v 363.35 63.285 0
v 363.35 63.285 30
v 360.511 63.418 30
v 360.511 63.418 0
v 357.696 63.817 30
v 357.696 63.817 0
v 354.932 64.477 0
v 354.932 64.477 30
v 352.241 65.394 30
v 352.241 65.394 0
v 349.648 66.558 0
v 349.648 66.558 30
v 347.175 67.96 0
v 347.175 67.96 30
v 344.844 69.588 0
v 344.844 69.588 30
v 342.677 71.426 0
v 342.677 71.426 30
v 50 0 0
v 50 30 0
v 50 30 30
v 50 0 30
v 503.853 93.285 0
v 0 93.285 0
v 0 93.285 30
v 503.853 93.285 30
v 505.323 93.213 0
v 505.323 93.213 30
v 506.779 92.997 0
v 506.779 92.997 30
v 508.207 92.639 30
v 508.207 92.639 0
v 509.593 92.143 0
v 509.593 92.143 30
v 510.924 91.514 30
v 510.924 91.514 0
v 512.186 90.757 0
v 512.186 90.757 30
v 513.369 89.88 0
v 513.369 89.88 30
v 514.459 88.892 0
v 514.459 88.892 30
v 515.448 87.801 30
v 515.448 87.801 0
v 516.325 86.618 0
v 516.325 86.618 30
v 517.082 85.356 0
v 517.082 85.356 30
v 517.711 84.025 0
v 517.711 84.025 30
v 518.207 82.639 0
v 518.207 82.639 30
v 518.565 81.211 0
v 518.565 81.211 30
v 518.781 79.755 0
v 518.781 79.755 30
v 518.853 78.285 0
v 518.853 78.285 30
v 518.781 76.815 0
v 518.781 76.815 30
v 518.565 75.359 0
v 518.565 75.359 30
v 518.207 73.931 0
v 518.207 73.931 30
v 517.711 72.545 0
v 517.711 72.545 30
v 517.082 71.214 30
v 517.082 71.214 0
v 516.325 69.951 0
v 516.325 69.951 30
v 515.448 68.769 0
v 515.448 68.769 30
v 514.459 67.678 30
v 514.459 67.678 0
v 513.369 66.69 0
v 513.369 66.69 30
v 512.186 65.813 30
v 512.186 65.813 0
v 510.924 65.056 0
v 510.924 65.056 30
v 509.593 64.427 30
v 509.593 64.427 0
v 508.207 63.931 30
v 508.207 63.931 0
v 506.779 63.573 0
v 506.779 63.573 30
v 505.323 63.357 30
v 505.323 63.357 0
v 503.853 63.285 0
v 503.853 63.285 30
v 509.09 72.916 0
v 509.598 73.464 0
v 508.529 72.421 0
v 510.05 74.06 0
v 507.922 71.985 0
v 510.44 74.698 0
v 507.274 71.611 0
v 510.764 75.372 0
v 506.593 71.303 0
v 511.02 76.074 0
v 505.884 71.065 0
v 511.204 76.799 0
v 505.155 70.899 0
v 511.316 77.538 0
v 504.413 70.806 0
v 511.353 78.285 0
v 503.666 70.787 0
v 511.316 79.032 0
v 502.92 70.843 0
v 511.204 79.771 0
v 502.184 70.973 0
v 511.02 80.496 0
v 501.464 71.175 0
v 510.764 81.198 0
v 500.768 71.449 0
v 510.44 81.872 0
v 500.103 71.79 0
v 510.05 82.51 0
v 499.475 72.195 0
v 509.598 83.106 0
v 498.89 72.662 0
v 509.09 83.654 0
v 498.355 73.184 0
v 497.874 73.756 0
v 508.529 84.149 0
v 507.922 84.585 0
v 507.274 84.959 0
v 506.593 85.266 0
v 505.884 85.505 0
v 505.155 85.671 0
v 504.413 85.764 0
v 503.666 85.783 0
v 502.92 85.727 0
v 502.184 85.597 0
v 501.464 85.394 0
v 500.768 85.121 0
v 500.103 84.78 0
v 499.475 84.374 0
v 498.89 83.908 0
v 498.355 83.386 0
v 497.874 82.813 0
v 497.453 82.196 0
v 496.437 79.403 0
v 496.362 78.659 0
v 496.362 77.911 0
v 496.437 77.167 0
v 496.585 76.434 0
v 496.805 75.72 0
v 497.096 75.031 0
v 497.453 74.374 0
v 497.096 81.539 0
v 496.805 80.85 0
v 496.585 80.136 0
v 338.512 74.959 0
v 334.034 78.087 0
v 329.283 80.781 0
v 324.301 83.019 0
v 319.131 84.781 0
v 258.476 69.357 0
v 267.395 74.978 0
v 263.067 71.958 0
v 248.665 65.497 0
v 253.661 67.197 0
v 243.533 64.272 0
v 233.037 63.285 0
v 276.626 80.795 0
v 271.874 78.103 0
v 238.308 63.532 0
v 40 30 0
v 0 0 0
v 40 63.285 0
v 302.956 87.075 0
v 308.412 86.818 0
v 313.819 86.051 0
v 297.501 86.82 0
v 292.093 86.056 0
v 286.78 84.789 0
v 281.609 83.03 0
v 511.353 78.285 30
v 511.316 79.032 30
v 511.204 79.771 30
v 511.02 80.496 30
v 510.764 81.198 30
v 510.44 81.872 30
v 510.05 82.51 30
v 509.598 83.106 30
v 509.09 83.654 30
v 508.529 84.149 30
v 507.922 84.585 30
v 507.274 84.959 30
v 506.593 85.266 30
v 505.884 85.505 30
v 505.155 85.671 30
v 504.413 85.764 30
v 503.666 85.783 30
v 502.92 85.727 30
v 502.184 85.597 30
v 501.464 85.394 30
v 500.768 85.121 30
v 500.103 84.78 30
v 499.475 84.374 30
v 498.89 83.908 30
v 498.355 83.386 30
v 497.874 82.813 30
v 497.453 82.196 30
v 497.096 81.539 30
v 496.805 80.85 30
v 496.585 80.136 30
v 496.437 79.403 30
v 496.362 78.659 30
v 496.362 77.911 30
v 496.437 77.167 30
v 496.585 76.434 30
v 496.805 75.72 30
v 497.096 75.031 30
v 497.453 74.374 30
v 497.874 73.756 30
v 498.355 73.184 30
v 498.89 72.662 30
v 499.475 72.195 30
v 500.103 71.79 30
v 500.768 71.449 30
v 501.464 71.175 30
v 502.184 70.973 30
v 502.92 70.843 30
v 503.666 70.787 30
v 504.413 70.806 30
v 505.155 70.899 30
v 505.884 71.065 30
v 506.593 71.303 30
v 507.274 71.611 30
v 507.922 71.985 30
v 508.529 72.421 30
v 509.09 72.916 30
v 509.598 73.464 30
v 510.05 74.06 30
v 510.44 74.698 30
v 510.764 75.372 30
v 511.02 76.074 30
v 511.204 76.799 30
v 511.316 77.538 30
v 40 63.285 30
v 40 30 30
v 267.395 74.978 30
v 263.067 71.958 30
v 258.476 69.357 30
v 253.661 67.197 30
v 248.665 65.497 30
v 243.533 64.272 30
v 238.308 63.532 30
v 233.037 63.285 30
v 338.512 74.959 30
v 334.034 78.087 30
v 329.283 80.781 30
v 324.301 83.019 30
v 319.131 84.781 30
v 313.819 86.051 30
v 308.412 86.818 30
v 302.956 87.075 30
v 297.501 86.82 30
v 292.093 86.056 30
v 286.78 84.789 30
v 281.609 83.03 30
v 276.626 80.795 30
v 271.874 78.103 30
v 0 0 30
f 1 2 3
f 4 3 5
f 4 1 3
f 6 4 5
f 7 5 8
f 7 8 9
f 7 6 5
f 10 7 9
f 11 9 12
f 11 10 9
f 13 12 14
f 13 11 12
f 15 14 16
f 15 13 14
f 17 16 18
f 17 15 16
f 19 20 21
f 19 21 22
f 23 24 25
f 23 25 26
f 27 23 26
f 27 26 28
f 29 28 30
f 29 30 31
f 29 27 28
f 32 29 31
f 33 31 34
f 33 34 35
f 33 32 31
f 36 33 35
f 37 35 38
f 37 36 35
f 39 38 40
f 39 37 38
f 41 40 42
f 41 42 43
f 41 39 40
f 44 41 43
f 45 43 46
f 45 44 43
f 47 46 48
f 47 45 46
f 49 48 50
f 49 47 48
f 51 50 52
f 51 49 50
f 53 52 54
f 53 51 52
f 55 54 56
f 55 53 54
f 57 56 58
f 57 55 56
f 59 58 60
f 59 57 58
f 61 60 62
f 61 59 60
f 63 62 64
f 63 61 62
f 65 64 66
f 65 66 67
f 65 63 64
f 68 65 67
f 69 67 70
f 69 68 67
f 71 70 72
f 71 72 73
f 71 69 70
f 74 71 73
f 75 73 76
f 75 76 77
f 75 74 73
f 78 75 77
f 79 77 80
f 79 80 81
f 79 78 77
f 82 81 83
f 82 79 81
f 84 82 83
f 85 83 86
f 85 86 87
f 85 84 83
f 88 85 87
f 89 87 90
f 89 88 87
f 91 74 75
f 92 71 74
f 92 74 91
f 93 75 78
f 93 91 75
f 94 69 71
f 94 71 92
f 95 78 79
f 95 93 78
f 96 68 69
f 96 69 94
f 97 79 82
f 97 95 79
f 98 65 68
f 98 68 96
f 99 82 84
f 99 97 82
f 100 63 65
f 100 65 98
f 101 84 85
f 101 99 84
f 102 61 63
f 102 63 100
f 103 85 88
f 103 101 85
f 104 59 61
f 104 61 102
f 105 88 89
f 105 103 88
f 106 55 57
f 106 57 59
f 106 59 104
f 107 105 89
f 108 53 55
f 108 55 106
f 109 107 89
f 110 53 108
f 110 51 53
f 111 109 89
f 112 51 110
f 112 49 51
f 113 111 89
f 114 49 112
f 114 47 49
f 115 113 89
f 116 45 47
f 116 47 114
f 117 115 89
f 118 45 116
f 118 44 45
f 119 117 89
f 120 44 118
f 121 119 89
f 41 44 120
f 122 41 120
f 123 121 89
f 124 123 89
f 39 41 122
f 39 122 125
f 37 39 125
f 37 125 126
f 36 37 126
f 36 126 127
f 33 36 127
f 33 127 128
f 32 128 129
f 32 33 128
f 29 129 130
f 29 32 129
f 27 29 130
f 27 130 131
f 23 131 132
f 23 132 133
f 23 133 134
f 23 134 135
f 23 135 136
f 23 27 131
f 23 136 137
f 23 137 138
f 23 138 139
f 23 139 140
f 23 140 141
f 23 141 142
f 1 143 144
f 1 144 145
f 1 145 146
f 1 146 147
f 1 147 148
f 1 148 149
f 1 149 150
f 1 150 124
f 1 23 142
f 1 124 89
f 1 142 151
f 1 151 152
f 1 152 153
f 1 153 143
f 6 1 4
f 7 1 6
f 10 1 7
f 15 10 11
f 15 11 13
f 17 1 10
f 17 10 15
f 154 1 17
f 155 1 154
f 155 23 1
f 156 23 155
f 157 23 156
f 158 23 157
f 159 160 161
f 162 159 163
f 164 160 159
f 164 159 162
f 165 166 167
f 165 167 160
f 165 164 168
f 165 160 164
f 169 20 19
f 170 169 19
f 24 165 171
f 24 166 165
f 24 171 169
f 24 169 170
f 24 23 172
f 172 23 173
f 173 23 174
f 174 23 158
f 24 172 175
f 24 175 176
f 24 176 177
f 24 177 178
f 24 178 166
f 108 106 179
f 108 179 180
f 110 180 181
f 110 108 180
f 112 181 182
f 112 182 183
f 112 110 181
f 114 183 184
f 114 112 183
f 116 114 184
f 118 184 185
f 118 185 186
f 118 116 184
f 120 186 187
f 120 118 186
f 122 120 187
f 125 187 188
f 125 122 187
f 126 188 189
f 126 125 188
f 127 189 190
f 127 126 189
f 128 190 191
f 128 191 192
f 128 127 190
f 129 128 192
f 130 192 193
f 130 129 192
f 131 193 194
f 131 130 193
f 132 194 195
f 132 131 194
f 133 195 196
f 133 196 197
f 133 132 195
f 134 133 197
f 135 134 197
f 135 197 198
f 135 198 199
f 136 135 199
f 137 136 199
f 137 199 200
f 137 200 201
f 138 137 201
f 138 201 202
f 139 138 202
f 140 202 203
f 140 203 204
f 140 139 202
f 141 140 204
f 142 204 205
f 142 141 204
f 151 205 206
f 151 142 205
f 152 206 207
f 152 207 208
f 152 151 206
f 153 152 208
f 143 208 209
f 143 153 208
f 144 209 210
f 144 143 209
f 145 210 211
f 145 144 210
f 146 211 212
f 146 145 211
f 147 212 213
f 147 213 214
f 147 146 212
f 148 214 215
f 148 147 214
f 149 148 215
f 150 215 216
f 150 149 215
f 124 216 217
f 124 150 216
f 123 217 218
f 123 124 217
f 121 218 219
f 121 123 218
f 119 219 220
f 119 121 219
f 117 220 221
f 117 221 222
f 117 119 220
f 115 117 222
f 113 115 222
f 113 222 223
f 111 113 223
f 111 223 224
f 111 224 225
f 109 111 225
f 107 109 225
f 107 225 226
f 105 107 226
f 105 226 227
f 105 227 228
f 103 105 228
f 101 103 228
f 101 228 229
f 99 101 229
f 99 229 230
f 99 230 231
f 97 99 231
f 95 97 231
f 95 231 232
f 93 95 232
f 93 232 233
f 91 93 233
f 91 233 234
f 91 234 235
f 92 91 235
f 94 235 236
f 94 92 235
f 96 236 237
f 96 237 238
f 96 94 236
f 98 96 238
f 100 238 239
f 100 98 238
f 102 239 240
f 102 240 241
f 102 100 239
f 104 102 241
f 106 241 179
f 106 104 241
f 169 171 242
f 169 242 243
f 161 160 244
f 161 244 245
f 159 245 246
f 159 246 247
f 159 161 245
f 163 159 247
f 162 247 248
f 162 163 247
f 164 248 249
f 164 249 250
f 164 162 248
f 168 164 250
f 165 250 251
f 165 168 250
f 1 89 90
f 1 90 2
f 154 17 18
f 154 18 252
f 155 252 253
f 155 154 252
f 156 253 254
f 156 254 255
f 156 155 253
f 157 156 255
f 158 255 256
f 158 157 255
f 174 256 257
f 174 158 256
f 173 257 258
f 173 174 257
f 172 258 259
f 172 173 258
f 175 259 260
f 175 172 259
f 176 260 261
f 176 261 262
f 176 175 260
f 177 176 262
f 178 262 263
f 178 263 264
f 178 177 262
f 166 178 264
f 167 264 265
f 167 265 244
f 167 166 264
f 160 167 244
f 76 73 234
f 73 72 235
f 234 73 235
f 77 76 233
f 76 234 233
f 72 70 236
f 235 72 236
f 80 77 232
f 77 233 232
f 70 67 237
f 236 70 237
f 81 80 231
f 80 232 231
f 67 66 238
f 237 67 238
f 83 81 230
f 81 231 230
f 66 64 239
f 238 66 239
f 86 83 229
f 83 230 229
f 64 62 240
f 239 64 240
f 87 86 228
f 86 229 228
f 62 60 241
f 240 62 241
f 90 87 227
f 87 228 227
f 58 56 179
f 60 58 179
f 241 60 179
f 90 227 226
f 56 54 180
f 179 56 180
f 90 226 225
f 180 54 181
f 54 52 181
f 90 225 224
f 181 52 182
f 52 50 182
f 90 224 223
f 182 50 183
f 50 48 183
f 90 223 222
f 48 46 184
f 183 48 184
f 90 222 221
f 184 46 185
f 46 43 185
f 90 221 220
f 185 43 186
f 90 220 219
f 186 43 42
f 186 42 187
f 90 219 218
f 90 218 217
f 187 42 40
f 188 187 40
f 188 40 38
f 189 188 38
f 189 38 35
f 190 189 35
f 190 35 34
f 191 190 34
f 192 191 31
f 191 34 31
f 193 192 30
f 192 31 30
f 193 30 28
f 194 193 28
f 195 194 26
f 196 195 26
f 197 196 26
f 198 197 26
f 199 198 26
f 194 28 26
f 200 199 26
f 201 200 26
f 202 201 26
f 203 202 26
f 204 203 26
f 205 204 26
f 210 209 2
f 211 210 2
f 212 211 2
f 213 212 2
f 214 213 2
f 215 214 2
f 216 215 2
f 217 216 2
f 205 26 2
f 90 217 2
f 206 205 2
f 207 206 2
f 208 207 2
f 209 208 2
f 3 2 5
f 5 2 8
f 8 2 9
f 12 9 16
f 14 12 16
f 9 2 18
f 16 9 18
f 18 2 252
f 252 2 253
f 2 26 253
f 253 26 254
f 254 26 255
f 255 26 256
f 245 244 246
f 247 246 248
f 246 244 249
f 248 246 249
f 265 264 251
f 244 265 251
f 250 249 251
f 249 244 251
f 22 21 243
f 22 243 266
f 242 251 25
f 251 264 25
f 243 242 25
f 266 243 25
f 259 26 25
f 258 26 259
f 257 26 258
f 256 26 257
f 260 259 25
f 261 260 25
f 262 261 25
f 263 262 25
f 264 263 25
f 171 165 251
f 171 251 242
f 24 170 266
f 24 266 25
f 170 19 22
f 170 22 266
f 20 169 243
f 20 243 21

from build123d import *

# Parameters (mm, degrees)
SKETCH1_R           = 7.5
BOSS_EXTRUDE1_DEPTH = 30


with BuildPart() as part:
    # Sketch1 → Boss-Extrude1 (new body)
    with BuildSketch(Plane.XY):
        with BuildLine():
            Line((50, 0), (0, 0))
            Line((0, 0), (0, 93.284928504))
            Line((0, 93.284928504), (503.852842171, 93.284928504))
            ThreePointArc((503.852842171, 93.284928504), (518.852842171, 78.284928504), (503.852842171, 63.284928504))
            Line((503.852842171, 63.284928504), (363.350187842, 63.284928504))
            ThreePointArc((363.350187842, 63.284928504), (352.240737336, 65.393651705), (342.676664352, 71.426487861))
            ThreePointArc((342.676664352, 71.426487861), (305.687057236, 87.010211012), (267.394723934, 74.977726972))
            ThreePointArc((267.394723934, 74.977726972), (251.183228702, 66.288195069), (233.036577983, 63.284928504))
            Line((233.036577983, 63.284928504), (40, 63.284928504))
            Line((40, 63.284928504), (40, 30))
            Line((40, 30), (50, 30))
            Line((50, 30), (50, 0))
        make_face()
        with Locations((503.852842171, 78.284928504)):
            Circle(SKETCH1_R, mode=Mode.SUBTRACT)
    extrude(amount=BOSS_EXTRUDE1_DEPTH)


solid = part.part
